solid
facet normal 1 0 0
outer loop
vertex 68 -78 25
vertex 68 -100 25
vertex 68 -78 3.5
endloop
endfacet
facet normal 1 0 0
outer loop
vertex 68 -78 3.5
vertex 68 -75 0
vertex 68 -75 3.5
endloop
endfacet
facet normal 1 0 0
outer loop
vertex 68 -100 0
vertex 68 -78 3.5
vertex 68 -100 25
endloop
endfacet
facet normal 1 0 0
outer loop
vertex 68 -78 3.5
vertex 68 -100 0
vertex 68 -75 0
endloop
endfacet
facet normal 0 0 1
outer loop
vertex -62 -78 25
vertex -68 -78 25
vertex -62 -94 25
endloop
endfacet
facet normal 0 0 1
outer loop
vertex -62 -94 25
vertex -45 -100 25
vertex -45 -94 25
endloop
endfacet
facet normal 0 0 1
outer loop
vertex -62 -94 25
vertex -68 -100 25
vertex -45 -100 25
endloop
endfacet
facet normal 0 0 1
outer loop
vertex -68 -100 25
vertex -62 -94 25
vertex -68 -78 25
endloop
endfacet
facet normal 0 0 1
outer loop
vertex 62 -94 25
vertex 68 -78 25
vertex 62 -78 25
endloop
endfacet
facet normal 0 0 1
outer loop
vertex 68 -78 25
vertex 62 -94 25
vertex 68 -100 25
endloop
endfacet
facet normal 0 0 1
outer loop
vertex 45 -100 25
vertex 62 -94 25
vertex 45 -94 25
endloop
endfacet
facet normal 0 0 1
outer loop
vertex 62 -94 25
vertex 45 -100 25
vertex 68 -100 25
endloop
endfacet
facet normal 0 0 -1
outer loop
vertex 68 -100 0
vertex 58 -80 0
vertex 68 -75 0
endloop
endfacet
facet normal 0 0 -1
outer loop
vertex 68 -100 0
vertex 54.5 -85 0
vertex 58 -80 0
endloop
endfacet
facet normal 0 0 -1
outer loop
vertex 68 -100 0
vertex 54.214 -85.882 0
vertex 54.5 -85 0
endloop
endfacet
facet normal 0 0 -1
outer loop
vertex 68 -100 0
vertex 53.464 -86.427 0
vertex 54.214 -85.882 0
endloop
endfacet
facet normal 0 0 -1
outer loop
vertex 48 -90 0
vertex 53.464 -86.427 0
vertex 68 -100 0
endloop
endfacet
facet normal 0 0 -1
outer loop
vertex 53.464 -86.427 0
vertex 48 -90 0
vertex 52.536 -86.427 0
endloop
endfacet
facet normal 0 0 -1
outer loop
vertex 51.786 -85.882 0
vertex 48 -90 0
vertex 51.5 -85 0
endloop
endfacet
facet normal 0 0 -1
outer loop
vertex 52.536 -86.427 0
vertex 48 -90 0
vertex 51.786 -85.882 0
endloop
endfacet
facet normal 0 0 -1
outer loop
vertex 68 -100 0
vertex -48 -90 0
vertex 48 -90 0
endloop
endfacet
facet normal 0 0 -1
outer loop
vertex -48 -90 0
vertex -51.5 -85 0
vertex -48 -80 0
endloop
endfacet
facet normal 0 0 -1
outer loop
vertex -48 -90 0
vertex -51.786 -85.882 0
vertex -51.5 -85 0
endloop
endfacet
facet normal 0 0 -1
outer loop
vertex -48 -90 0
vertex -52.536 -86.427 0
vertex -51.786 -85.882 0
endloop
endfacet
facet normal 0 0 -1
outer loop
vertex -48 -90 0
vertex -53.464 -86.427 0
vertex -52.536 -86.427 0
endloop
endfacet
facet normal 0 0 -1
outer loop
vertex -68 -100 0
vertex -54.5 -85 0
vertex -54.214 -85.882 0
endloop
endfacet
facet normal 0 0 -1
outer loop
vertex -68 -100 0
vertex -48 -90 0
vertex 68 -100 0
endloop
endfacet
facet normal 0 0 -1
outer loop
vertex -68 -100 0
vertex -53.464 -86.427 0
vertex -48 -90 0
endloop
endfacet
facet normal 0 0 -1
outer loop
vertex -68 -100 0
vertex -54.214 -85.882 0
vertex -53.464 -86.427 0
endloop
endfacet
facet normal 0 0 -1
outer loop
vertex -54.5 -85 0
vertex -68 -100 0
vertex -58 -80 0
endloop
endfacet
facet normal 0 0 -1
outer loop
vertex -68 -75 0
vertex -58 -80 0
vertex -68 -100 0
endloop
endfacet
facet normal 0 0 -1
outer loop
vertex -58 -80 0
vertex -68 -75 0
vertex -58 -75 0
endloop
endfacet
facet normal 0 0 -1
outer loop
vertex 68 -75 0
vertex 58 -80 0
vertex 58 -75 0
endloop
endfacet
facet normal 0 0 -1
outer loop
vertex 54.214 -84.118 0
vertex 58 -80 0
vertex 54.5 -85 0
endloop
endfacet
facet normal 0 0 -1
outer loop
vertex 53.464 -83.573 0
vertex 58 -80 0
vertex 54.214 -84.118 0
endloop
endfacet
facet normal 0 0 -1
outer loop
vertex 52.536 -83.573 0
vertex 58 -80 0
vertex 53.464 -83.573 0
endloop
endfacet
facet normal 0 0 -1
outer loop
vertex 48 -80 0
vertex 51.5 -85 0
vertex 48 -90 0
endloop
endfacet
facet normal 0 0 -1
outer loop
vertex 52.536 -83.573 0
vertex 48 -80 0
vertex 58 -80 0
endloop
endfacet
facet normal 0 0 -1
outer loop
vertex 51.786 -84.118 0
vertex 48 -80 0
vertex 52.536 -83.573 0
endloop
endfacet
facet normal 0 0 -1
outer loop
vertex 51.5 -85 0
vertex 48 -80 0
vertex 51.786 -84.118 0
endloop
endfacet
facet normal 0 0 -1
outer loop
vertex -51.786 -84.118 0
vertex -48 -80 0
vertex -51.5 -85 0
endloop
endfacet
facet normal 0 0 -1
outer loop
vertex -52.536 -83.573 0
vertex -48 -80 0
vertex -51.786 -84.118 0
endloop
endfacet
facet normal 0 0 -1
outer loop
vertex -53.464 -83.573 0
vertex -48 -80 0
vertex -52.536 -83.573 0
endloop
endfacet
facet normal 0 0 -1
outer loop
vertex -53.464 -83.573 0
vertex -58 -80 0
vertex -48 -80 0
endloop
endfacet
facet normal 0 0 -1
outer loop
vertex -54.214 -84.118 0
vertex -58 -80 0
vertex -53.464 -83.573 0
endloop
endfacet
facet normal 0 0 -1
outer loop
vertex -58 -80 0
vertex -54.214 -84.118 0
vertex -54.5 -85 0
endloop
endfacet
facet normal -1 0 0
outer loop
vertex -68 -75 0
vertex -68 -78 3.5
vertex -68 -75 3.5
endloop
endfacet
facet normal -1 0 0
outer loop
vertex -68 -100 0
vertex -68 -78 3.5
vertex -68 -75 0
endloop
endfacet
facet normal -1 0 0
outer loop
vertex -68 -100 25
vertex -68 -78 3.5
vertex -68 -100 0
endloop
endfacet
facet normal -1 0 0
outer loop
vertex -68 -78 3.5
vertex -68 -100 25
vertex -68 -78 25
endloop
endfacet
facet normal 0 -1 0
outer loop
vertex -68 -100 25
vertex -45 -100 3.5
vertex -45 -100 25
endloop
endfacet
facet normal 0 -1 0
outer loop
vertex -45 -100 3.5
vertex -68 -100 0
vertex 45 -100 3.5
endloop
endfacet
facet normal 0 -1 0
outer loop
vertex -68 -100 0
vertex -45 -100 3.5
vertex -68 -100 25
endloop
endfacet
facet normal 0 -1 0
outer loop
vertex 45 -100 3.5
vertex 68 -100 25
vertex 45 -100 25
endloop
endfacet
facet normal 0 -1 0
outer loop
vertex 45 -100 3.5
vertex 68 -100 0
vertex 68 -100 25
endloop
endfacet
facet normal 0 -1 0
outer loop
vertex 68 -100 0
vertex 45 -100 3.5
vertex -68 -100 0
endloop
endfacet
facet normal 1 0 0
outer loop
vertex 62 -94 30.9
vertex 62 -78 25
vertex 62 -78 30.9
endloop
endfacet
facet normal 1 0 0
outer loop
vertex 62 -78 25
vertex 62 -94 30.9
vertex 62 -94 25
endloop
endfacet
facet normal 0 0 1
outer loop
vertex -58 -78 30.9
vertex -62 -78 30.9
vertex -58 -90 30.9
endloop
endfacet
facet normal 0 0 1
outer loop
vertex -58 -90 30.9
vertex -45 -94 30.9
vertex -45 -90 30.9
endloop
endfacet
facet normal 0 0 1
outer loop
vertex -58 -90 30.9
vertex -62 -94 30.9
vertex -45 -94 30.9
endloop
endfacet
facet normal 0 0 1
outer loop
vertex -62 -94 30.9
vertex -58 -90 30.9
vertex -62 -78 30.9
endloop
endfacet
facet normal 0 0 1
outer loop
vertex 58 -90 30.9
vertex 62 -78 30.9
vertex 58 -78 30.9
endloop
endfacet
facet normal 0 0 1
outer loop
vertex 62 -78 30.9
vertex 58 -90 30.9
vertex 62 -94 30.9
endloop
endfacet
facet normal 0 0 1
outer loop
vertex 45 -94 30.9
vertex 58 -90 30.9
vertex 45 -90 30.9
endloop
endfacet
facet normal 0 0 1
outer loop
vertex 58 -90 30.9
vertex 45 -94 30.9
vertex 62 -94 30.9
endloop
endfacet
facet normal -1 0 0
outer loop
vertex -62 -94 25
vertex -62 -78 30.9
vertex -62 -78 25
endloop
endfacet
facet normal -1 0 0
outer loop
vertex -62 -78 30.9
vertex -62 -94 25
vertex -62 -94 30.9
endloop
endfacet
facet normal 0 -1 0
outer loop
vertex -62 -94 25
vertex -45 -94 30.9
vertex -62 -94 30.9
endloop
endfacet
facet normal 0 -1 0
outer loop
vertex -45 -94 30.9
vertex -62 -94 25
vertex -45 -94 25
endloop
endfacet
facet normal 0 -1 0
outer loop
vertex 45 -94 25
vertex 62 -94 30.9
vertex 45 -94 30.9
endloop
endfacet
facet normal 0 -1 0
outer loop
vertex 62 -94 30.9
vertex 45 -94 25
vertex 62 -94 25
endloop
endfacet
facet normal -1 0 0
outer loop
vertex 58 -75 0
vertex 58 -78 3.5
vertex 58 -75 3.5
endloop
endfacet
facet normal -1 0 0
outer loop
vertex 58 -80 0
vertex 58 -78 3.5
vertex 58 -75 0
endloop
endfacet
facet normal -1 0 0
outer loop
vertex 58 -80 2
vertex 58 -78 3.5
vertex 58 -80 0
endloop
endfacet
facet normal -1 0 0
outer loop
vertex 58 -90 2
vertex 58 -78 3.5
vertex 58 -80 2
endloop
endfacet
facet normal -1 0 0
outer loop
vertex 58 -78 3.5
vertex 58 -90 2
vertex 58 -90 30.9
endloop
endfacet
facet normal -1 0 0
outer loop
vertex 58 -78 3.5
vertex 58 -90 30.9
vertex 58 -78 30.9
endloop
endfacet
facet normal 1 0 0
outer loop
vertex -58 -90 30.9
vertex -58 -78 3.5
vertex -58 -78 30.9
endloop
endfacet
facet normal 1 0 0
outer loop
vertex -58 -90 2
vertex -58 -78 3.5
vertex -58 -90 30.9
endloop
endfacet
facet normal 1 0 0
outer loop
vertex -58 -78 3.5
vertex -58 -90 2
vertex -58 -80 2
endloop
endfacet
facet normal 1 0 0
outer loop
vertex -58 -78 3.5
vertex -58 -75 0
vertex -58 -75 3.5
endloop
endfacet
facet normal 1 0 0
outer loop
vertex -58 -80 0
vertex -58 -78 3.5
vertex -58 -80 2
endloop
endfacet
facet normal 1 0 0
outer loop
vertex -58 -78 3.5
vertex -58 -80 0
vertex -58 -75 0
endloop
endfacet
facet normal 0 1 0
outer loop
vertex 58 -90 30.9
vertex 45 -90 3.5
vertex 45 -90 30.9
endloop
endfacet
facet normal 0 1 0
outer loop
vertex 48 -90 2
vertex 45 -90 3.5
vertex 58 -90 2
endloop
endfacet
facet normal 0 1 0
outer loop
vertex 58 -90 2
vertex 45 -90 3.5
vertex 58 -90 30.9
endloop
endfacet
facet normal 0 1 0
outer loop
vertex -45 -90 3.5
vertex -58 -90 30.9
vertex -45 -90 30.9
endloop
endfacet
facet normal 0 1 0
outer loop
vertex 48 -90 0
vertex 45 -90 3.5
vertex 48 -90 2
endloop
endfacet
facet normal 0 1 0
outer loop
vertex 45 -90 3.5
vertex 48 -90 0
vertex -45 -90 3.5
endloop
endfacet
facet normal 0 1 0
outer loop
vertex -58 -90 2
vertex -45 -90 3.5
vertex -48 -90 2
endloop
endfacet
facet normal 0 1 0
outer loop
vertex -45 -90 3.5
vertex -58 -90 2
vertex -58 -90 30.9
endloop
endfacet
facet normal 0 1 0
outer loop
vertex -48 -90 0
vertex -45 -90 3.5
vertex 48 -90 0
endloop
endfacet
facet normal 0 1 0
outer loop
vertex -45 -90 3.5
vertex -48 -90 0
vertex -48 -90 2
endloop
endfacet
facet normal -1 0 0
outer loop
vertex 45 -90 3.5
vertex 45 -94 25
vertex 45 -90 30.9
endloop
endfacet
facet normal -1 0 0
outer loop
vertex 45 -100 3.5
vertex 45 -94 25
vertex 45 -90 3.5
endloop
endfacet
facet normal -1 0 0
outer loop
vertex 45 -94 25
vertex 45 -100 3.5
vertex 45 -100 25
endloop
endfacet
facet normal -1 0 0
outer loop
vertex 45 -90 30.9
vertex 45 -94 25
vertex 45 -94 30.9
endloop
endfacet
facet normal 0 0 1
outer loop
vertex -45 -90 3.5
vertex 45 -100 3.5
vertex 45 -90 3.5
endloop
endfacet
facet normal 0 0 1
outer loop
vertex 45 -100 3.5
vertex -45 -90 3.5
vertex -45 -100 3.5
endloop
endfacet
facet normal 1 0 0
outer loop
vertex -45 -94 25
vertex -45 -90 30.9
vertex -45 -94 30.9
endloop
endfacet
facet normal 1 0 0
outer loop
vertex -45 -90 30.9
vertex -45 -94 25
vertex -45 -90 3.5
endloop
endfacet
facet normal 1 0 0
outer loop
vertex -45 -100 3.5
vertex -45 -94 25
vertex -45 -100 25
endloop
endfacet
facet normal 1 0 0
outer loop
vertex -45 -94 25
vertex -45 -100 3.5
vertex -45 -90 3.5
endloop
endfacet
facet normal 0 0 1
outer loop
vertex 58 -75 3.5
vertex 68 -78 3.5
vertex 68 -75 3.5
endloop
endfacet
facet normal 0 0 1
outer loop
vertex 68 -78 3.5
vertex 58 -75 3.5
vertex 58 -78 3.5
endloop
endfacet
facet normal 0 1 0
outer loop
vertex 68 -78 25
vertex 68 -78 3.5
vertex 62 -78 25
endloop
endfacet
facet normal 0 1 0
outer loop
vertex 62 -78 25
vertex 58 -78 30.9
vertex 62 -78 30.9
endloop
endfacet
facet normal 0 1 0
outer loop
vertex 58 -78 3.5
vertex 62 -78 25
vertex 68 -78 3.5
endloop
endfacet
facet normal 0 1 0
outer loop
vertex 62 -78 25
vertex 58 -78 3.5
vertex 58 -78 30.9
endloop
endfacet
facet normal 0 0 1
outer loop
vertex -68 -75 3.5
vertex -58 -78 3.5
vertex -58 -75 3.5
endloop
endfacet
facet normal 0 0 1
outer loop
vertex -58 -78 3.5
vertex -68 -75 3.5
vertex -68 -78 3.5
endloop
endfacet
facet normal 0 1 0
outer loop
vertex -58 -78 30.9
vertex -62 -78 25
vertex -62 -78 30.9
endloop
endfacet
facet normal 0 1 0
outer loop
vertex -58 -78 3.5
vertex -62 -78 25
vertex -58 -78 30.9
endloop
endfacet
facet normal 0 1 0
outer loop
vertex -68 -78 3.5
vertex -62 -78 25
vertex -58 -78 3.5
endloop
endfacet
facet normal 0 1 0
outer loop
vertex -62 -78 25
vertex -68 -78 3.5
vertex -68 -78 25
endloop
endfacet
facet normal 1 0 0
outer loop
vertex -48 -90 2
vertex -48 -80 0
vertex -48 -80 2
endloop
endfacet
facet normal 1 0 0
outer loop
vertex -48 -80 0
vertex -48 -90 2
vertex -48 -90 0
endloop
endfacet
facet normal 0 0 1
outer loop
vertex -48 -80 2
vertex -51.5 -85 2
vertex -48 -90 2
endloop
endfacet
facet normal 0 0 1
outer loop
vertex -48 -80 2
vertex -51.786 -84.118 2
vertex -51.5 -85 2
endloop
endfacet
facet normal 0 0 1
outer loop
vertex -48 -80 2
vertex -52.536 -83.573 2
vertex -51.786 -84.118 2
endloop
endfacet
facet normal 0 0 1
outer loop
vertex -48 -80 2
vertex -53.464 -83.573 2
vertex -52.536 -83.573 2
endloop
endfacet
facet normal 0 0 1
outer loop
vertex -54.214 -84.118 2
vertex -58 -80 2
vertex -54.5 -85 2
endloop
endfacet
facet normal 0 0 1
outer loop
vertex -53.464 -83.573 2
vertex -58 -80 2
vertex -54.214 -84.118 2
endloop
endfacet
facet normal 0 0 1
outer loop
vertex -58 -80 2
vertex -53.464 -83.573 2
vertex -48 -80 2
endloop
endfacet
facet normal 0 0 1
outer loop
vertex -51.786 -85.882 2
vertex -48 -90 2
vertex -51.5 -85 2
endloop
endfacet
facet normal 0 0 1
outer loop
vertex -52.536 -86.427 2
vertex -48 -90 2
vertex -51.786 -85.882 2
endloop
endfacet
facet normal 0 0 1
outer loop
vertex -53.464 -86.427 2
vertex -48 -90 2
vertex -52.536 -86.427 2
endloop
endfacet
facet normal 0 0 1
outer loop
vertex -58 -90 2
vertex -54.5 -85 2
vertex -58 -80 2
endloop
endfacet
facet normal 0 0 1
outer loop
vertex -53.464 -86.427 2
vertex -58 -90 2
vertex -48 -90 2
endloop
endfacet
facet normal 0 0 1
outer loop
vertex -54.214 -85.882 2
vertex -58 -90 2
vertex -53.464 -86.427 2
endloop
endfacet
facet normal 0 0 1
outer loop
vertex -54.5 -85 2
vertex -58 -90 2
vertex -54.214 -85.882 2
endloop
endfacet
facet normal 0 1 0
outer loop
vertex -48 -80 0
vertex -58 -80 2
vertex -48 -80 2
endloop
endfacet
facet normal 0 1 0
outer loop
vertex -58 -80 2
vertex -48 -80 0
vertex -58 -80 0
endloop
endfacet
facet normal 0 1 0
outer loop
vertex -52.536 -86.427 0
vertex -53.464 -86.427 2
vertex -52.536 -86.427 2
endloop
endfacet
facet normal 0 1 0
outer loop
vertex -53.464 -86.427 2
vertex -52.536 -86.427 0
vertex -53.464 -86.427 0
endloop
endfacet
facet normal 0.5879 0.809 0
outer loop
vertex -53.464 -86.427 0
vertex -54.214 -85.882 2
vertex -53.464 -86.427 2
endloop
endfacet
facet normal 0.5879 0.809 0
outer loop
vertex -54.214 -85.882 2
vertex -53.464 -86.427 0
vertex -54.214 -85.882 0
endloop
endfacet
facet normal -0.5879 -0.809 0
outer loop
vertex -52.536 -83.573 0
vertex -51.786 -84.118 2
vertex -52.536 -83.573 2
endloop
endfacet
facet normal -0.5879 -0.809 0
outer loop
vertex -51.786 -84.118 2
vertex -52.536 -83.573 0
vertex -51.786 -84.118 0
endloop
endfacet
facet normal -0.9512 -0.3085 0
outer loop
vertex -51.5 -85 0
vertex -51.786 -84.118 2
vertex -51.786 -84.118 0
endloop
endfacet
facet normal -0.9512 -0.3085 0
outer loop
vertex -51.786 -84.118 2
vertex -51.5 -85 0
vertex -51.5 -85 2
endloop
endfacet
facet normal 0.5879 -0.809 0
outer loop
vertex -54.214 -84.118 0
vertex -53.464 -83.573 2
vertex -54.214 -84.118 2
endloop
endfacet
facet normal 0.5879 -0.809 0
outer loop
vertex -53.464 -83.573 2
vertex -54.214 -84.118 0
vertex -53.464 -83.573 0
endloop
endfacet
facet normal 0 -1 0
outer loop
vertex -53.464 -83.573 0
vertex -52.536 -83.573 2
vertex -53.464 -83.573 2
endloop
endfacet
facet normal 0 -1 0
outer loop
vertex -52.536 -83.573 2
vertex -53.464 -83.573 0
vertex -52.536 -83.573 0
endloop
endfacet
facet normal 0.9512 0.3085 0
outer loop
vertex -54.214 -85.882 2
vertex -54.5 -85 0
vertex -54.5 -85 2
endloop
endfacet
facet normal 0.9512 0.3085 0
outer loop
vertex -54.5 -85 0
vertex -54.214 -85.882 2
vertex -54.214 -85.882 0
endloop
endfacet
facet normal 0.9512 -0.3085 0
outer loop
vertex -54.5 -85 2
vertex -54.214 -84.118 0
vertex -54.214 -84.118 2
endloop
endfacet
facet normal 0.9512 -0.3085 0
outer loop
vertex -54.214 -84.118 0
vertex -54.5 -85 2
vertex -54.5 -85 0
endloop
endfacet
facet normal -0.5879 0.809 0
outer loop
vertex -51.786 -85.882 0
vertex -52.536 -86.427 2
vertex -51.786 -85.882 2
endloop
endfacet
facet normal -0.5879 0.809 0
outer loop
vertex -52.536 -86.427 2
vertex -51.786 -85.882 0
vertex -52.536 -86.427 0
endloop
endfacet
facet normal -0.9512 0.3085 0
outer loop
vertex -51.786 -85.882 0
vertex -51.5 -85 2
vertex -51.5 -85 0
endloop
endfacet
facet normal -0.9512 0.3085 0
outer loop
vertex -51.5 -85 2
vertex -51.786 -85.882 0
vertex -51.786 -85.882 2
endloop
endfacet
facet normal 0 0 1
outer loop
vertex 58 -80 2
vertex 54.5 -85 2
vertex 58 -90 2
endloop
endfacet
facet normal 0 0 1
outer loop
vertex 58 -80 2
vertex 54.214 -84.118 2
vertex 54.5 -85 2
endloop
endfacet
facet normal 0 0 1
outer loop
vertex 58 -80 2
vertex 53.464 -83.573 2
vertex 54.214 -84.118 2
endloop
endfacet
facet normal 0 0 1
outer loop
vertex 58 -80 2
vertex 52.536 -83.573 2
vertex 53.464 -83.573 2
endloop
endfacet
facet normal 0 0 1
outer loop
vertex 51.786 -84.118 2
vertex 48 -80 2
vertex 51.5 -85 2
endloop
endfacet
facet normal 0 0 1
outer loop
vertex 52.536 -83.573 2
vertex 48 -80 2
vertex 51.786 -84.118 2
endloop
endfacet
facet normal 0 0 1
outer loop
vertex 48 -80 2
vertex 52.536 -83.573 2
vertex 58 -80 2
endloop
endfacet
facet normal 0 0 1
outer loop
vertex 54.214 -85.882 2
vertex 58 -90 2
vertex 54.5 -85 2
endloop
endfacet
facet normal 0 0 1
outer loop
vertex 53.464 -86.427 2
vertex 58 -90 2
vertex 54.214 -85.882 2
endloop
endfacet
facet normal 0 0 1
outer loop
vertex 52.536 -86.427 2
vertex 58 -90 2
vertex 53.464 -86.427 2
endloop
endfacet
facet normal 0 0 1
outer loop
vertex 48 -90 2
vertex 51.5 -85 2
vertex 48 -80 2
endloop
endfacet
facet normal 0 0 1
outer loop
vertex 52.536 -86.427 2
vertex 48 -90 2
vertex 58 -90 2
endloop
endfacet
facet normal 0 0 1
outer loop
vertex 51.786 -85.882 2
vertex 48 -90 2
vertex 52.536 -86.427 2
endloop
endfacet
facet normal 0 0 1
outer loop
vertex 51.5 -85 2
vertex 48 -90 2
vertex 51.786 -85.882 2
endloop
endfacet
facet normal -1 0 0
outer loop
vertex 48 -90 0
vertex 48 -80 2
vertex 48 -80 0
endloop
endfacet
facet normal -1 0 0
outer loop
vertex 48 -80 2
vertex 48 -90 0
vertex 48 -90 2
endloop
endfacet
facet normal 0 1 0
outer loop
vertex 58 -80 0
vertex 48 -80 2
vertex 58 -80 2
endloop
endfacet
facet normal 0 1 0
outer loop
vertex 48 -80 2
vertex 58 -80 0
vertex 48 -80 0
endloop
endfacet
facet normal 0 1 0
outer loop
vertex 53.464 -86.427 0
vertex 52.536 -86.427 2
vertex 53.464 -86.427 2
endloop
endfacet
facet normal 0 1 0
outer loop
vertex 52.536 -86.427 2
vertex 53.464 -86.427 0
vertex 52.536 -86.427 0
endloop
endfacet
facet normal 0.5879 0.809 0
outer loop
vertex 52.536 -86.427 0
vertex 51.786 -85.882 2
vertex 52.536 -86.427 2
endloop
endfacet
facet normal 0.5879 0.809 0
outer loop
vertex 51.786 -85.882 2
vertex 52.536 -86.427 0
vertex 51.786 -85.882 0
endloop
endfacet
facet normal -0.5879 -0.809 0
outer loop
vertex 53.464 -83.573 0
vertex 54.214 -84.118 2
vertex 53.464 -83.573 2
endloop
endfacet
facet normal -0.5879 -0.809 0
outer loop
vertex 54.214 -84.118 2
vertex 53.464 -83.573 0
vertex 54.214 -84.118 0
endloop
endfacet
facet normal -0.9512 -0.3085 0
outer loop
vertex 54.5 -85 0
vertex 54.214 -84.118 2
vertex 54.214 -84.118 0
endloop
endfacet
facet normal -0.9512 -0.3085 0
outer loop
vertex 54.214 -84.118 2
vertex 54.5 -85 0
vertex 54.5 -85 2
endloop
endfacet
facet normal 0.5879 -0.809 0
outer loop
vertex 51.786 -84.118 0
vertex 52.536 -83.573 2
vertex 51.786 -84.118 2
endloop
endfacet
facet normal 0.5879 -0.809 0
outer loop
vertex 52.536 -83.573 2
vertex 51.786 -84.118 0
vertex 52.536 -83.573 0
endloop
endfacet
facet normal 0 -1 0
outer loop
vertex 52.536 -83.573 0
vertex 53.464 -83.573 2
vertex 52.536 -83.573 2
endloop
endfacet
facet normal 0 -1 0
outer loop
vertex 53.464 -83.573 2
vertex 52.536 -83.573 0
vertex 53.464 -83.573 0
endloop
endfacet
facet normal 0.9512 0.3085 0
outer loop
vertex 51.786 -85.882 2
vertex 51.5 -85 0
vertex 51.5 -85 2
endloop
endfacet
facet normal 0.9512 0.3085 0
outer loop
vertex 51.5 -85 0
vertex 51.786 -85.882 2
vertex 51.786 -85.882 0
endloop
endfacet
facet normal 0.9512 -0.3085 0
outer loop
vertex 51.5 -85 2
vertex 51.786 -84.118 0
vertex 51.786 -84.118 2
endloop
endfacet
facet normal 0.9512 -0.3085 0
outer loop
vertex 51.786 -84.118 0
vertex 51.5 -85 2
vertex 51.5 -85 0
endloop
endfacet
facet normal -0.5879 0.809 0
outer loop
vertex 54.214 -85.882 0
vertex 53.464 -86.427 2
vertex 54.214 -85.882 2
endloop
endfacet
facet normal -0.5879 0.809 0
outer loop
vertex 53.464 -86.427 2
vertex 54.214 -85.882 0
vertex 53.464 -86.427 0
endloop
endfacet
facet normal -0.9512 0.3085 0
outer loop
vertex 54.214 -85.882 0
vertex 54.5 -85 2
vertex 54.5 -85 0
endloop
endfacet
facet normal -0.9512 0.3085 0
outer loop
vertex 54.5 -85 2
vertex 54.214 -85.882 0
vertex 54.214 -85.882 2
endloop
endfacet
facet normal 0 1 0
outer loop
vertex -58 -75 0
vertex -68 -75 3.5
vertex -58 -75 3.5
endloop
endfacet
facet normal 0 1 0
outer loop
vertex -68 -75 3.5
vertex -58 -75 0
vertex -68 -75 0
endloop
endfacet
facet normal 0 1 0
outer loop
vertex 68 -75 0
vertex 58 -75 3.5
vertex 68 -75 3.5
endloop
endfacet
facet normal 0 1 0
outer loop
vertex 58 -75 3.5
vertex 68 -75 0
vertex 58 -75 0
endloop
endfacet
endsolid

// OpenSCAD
$fn=10;

difference()
{
union()
{
difference()
{
    union()
    {
        translate([0,0,12.5])
        cube([136,200,25],center=true);
        translate([0,0,27.9])
        cube([124,188,6],center=true);
    }
    union()
    {
        translate([0,0,15.5])
        cube([116,180,33], center=true);
        translate([-45,-101,3.5])
        cube([90,13,30]);
        translate([-45,88,3.5])
        cube([90,13,30]);
        
         translate([57,-78,3.5])
        cube([13,156,30]);
         translate([-70,-78,3.5])
        cube([13,156,30]);
    }
}
translate([-59,80,0])
{   
    difference()
    {
        cube([11,11,2]);
        translate([6,5,-.1])
        cylinder(4,1.5,1.5);
    }
}

translate([48,80,0])
{
    difference()
    {
        cube([11,11,2]);
        translate([5,5,-.10])
        cylinder(4,1.5,1.5);
    }
}

translate([-59,-91,0])
{
    difference()
    {
        cube([11,11,2]);
        translate([6,6,-.10])
        cylinder(4,1.5,1.5);
    }
}

translate([48,-91,0])
{
    difference()
    {
        cube([11,11,2]);
        translate([5,6,-.10])
        cylinder(4,1.5,1.5);
    }
}
}
translate([-69,-75,-0.1])
cube([138,200,35]);


}
